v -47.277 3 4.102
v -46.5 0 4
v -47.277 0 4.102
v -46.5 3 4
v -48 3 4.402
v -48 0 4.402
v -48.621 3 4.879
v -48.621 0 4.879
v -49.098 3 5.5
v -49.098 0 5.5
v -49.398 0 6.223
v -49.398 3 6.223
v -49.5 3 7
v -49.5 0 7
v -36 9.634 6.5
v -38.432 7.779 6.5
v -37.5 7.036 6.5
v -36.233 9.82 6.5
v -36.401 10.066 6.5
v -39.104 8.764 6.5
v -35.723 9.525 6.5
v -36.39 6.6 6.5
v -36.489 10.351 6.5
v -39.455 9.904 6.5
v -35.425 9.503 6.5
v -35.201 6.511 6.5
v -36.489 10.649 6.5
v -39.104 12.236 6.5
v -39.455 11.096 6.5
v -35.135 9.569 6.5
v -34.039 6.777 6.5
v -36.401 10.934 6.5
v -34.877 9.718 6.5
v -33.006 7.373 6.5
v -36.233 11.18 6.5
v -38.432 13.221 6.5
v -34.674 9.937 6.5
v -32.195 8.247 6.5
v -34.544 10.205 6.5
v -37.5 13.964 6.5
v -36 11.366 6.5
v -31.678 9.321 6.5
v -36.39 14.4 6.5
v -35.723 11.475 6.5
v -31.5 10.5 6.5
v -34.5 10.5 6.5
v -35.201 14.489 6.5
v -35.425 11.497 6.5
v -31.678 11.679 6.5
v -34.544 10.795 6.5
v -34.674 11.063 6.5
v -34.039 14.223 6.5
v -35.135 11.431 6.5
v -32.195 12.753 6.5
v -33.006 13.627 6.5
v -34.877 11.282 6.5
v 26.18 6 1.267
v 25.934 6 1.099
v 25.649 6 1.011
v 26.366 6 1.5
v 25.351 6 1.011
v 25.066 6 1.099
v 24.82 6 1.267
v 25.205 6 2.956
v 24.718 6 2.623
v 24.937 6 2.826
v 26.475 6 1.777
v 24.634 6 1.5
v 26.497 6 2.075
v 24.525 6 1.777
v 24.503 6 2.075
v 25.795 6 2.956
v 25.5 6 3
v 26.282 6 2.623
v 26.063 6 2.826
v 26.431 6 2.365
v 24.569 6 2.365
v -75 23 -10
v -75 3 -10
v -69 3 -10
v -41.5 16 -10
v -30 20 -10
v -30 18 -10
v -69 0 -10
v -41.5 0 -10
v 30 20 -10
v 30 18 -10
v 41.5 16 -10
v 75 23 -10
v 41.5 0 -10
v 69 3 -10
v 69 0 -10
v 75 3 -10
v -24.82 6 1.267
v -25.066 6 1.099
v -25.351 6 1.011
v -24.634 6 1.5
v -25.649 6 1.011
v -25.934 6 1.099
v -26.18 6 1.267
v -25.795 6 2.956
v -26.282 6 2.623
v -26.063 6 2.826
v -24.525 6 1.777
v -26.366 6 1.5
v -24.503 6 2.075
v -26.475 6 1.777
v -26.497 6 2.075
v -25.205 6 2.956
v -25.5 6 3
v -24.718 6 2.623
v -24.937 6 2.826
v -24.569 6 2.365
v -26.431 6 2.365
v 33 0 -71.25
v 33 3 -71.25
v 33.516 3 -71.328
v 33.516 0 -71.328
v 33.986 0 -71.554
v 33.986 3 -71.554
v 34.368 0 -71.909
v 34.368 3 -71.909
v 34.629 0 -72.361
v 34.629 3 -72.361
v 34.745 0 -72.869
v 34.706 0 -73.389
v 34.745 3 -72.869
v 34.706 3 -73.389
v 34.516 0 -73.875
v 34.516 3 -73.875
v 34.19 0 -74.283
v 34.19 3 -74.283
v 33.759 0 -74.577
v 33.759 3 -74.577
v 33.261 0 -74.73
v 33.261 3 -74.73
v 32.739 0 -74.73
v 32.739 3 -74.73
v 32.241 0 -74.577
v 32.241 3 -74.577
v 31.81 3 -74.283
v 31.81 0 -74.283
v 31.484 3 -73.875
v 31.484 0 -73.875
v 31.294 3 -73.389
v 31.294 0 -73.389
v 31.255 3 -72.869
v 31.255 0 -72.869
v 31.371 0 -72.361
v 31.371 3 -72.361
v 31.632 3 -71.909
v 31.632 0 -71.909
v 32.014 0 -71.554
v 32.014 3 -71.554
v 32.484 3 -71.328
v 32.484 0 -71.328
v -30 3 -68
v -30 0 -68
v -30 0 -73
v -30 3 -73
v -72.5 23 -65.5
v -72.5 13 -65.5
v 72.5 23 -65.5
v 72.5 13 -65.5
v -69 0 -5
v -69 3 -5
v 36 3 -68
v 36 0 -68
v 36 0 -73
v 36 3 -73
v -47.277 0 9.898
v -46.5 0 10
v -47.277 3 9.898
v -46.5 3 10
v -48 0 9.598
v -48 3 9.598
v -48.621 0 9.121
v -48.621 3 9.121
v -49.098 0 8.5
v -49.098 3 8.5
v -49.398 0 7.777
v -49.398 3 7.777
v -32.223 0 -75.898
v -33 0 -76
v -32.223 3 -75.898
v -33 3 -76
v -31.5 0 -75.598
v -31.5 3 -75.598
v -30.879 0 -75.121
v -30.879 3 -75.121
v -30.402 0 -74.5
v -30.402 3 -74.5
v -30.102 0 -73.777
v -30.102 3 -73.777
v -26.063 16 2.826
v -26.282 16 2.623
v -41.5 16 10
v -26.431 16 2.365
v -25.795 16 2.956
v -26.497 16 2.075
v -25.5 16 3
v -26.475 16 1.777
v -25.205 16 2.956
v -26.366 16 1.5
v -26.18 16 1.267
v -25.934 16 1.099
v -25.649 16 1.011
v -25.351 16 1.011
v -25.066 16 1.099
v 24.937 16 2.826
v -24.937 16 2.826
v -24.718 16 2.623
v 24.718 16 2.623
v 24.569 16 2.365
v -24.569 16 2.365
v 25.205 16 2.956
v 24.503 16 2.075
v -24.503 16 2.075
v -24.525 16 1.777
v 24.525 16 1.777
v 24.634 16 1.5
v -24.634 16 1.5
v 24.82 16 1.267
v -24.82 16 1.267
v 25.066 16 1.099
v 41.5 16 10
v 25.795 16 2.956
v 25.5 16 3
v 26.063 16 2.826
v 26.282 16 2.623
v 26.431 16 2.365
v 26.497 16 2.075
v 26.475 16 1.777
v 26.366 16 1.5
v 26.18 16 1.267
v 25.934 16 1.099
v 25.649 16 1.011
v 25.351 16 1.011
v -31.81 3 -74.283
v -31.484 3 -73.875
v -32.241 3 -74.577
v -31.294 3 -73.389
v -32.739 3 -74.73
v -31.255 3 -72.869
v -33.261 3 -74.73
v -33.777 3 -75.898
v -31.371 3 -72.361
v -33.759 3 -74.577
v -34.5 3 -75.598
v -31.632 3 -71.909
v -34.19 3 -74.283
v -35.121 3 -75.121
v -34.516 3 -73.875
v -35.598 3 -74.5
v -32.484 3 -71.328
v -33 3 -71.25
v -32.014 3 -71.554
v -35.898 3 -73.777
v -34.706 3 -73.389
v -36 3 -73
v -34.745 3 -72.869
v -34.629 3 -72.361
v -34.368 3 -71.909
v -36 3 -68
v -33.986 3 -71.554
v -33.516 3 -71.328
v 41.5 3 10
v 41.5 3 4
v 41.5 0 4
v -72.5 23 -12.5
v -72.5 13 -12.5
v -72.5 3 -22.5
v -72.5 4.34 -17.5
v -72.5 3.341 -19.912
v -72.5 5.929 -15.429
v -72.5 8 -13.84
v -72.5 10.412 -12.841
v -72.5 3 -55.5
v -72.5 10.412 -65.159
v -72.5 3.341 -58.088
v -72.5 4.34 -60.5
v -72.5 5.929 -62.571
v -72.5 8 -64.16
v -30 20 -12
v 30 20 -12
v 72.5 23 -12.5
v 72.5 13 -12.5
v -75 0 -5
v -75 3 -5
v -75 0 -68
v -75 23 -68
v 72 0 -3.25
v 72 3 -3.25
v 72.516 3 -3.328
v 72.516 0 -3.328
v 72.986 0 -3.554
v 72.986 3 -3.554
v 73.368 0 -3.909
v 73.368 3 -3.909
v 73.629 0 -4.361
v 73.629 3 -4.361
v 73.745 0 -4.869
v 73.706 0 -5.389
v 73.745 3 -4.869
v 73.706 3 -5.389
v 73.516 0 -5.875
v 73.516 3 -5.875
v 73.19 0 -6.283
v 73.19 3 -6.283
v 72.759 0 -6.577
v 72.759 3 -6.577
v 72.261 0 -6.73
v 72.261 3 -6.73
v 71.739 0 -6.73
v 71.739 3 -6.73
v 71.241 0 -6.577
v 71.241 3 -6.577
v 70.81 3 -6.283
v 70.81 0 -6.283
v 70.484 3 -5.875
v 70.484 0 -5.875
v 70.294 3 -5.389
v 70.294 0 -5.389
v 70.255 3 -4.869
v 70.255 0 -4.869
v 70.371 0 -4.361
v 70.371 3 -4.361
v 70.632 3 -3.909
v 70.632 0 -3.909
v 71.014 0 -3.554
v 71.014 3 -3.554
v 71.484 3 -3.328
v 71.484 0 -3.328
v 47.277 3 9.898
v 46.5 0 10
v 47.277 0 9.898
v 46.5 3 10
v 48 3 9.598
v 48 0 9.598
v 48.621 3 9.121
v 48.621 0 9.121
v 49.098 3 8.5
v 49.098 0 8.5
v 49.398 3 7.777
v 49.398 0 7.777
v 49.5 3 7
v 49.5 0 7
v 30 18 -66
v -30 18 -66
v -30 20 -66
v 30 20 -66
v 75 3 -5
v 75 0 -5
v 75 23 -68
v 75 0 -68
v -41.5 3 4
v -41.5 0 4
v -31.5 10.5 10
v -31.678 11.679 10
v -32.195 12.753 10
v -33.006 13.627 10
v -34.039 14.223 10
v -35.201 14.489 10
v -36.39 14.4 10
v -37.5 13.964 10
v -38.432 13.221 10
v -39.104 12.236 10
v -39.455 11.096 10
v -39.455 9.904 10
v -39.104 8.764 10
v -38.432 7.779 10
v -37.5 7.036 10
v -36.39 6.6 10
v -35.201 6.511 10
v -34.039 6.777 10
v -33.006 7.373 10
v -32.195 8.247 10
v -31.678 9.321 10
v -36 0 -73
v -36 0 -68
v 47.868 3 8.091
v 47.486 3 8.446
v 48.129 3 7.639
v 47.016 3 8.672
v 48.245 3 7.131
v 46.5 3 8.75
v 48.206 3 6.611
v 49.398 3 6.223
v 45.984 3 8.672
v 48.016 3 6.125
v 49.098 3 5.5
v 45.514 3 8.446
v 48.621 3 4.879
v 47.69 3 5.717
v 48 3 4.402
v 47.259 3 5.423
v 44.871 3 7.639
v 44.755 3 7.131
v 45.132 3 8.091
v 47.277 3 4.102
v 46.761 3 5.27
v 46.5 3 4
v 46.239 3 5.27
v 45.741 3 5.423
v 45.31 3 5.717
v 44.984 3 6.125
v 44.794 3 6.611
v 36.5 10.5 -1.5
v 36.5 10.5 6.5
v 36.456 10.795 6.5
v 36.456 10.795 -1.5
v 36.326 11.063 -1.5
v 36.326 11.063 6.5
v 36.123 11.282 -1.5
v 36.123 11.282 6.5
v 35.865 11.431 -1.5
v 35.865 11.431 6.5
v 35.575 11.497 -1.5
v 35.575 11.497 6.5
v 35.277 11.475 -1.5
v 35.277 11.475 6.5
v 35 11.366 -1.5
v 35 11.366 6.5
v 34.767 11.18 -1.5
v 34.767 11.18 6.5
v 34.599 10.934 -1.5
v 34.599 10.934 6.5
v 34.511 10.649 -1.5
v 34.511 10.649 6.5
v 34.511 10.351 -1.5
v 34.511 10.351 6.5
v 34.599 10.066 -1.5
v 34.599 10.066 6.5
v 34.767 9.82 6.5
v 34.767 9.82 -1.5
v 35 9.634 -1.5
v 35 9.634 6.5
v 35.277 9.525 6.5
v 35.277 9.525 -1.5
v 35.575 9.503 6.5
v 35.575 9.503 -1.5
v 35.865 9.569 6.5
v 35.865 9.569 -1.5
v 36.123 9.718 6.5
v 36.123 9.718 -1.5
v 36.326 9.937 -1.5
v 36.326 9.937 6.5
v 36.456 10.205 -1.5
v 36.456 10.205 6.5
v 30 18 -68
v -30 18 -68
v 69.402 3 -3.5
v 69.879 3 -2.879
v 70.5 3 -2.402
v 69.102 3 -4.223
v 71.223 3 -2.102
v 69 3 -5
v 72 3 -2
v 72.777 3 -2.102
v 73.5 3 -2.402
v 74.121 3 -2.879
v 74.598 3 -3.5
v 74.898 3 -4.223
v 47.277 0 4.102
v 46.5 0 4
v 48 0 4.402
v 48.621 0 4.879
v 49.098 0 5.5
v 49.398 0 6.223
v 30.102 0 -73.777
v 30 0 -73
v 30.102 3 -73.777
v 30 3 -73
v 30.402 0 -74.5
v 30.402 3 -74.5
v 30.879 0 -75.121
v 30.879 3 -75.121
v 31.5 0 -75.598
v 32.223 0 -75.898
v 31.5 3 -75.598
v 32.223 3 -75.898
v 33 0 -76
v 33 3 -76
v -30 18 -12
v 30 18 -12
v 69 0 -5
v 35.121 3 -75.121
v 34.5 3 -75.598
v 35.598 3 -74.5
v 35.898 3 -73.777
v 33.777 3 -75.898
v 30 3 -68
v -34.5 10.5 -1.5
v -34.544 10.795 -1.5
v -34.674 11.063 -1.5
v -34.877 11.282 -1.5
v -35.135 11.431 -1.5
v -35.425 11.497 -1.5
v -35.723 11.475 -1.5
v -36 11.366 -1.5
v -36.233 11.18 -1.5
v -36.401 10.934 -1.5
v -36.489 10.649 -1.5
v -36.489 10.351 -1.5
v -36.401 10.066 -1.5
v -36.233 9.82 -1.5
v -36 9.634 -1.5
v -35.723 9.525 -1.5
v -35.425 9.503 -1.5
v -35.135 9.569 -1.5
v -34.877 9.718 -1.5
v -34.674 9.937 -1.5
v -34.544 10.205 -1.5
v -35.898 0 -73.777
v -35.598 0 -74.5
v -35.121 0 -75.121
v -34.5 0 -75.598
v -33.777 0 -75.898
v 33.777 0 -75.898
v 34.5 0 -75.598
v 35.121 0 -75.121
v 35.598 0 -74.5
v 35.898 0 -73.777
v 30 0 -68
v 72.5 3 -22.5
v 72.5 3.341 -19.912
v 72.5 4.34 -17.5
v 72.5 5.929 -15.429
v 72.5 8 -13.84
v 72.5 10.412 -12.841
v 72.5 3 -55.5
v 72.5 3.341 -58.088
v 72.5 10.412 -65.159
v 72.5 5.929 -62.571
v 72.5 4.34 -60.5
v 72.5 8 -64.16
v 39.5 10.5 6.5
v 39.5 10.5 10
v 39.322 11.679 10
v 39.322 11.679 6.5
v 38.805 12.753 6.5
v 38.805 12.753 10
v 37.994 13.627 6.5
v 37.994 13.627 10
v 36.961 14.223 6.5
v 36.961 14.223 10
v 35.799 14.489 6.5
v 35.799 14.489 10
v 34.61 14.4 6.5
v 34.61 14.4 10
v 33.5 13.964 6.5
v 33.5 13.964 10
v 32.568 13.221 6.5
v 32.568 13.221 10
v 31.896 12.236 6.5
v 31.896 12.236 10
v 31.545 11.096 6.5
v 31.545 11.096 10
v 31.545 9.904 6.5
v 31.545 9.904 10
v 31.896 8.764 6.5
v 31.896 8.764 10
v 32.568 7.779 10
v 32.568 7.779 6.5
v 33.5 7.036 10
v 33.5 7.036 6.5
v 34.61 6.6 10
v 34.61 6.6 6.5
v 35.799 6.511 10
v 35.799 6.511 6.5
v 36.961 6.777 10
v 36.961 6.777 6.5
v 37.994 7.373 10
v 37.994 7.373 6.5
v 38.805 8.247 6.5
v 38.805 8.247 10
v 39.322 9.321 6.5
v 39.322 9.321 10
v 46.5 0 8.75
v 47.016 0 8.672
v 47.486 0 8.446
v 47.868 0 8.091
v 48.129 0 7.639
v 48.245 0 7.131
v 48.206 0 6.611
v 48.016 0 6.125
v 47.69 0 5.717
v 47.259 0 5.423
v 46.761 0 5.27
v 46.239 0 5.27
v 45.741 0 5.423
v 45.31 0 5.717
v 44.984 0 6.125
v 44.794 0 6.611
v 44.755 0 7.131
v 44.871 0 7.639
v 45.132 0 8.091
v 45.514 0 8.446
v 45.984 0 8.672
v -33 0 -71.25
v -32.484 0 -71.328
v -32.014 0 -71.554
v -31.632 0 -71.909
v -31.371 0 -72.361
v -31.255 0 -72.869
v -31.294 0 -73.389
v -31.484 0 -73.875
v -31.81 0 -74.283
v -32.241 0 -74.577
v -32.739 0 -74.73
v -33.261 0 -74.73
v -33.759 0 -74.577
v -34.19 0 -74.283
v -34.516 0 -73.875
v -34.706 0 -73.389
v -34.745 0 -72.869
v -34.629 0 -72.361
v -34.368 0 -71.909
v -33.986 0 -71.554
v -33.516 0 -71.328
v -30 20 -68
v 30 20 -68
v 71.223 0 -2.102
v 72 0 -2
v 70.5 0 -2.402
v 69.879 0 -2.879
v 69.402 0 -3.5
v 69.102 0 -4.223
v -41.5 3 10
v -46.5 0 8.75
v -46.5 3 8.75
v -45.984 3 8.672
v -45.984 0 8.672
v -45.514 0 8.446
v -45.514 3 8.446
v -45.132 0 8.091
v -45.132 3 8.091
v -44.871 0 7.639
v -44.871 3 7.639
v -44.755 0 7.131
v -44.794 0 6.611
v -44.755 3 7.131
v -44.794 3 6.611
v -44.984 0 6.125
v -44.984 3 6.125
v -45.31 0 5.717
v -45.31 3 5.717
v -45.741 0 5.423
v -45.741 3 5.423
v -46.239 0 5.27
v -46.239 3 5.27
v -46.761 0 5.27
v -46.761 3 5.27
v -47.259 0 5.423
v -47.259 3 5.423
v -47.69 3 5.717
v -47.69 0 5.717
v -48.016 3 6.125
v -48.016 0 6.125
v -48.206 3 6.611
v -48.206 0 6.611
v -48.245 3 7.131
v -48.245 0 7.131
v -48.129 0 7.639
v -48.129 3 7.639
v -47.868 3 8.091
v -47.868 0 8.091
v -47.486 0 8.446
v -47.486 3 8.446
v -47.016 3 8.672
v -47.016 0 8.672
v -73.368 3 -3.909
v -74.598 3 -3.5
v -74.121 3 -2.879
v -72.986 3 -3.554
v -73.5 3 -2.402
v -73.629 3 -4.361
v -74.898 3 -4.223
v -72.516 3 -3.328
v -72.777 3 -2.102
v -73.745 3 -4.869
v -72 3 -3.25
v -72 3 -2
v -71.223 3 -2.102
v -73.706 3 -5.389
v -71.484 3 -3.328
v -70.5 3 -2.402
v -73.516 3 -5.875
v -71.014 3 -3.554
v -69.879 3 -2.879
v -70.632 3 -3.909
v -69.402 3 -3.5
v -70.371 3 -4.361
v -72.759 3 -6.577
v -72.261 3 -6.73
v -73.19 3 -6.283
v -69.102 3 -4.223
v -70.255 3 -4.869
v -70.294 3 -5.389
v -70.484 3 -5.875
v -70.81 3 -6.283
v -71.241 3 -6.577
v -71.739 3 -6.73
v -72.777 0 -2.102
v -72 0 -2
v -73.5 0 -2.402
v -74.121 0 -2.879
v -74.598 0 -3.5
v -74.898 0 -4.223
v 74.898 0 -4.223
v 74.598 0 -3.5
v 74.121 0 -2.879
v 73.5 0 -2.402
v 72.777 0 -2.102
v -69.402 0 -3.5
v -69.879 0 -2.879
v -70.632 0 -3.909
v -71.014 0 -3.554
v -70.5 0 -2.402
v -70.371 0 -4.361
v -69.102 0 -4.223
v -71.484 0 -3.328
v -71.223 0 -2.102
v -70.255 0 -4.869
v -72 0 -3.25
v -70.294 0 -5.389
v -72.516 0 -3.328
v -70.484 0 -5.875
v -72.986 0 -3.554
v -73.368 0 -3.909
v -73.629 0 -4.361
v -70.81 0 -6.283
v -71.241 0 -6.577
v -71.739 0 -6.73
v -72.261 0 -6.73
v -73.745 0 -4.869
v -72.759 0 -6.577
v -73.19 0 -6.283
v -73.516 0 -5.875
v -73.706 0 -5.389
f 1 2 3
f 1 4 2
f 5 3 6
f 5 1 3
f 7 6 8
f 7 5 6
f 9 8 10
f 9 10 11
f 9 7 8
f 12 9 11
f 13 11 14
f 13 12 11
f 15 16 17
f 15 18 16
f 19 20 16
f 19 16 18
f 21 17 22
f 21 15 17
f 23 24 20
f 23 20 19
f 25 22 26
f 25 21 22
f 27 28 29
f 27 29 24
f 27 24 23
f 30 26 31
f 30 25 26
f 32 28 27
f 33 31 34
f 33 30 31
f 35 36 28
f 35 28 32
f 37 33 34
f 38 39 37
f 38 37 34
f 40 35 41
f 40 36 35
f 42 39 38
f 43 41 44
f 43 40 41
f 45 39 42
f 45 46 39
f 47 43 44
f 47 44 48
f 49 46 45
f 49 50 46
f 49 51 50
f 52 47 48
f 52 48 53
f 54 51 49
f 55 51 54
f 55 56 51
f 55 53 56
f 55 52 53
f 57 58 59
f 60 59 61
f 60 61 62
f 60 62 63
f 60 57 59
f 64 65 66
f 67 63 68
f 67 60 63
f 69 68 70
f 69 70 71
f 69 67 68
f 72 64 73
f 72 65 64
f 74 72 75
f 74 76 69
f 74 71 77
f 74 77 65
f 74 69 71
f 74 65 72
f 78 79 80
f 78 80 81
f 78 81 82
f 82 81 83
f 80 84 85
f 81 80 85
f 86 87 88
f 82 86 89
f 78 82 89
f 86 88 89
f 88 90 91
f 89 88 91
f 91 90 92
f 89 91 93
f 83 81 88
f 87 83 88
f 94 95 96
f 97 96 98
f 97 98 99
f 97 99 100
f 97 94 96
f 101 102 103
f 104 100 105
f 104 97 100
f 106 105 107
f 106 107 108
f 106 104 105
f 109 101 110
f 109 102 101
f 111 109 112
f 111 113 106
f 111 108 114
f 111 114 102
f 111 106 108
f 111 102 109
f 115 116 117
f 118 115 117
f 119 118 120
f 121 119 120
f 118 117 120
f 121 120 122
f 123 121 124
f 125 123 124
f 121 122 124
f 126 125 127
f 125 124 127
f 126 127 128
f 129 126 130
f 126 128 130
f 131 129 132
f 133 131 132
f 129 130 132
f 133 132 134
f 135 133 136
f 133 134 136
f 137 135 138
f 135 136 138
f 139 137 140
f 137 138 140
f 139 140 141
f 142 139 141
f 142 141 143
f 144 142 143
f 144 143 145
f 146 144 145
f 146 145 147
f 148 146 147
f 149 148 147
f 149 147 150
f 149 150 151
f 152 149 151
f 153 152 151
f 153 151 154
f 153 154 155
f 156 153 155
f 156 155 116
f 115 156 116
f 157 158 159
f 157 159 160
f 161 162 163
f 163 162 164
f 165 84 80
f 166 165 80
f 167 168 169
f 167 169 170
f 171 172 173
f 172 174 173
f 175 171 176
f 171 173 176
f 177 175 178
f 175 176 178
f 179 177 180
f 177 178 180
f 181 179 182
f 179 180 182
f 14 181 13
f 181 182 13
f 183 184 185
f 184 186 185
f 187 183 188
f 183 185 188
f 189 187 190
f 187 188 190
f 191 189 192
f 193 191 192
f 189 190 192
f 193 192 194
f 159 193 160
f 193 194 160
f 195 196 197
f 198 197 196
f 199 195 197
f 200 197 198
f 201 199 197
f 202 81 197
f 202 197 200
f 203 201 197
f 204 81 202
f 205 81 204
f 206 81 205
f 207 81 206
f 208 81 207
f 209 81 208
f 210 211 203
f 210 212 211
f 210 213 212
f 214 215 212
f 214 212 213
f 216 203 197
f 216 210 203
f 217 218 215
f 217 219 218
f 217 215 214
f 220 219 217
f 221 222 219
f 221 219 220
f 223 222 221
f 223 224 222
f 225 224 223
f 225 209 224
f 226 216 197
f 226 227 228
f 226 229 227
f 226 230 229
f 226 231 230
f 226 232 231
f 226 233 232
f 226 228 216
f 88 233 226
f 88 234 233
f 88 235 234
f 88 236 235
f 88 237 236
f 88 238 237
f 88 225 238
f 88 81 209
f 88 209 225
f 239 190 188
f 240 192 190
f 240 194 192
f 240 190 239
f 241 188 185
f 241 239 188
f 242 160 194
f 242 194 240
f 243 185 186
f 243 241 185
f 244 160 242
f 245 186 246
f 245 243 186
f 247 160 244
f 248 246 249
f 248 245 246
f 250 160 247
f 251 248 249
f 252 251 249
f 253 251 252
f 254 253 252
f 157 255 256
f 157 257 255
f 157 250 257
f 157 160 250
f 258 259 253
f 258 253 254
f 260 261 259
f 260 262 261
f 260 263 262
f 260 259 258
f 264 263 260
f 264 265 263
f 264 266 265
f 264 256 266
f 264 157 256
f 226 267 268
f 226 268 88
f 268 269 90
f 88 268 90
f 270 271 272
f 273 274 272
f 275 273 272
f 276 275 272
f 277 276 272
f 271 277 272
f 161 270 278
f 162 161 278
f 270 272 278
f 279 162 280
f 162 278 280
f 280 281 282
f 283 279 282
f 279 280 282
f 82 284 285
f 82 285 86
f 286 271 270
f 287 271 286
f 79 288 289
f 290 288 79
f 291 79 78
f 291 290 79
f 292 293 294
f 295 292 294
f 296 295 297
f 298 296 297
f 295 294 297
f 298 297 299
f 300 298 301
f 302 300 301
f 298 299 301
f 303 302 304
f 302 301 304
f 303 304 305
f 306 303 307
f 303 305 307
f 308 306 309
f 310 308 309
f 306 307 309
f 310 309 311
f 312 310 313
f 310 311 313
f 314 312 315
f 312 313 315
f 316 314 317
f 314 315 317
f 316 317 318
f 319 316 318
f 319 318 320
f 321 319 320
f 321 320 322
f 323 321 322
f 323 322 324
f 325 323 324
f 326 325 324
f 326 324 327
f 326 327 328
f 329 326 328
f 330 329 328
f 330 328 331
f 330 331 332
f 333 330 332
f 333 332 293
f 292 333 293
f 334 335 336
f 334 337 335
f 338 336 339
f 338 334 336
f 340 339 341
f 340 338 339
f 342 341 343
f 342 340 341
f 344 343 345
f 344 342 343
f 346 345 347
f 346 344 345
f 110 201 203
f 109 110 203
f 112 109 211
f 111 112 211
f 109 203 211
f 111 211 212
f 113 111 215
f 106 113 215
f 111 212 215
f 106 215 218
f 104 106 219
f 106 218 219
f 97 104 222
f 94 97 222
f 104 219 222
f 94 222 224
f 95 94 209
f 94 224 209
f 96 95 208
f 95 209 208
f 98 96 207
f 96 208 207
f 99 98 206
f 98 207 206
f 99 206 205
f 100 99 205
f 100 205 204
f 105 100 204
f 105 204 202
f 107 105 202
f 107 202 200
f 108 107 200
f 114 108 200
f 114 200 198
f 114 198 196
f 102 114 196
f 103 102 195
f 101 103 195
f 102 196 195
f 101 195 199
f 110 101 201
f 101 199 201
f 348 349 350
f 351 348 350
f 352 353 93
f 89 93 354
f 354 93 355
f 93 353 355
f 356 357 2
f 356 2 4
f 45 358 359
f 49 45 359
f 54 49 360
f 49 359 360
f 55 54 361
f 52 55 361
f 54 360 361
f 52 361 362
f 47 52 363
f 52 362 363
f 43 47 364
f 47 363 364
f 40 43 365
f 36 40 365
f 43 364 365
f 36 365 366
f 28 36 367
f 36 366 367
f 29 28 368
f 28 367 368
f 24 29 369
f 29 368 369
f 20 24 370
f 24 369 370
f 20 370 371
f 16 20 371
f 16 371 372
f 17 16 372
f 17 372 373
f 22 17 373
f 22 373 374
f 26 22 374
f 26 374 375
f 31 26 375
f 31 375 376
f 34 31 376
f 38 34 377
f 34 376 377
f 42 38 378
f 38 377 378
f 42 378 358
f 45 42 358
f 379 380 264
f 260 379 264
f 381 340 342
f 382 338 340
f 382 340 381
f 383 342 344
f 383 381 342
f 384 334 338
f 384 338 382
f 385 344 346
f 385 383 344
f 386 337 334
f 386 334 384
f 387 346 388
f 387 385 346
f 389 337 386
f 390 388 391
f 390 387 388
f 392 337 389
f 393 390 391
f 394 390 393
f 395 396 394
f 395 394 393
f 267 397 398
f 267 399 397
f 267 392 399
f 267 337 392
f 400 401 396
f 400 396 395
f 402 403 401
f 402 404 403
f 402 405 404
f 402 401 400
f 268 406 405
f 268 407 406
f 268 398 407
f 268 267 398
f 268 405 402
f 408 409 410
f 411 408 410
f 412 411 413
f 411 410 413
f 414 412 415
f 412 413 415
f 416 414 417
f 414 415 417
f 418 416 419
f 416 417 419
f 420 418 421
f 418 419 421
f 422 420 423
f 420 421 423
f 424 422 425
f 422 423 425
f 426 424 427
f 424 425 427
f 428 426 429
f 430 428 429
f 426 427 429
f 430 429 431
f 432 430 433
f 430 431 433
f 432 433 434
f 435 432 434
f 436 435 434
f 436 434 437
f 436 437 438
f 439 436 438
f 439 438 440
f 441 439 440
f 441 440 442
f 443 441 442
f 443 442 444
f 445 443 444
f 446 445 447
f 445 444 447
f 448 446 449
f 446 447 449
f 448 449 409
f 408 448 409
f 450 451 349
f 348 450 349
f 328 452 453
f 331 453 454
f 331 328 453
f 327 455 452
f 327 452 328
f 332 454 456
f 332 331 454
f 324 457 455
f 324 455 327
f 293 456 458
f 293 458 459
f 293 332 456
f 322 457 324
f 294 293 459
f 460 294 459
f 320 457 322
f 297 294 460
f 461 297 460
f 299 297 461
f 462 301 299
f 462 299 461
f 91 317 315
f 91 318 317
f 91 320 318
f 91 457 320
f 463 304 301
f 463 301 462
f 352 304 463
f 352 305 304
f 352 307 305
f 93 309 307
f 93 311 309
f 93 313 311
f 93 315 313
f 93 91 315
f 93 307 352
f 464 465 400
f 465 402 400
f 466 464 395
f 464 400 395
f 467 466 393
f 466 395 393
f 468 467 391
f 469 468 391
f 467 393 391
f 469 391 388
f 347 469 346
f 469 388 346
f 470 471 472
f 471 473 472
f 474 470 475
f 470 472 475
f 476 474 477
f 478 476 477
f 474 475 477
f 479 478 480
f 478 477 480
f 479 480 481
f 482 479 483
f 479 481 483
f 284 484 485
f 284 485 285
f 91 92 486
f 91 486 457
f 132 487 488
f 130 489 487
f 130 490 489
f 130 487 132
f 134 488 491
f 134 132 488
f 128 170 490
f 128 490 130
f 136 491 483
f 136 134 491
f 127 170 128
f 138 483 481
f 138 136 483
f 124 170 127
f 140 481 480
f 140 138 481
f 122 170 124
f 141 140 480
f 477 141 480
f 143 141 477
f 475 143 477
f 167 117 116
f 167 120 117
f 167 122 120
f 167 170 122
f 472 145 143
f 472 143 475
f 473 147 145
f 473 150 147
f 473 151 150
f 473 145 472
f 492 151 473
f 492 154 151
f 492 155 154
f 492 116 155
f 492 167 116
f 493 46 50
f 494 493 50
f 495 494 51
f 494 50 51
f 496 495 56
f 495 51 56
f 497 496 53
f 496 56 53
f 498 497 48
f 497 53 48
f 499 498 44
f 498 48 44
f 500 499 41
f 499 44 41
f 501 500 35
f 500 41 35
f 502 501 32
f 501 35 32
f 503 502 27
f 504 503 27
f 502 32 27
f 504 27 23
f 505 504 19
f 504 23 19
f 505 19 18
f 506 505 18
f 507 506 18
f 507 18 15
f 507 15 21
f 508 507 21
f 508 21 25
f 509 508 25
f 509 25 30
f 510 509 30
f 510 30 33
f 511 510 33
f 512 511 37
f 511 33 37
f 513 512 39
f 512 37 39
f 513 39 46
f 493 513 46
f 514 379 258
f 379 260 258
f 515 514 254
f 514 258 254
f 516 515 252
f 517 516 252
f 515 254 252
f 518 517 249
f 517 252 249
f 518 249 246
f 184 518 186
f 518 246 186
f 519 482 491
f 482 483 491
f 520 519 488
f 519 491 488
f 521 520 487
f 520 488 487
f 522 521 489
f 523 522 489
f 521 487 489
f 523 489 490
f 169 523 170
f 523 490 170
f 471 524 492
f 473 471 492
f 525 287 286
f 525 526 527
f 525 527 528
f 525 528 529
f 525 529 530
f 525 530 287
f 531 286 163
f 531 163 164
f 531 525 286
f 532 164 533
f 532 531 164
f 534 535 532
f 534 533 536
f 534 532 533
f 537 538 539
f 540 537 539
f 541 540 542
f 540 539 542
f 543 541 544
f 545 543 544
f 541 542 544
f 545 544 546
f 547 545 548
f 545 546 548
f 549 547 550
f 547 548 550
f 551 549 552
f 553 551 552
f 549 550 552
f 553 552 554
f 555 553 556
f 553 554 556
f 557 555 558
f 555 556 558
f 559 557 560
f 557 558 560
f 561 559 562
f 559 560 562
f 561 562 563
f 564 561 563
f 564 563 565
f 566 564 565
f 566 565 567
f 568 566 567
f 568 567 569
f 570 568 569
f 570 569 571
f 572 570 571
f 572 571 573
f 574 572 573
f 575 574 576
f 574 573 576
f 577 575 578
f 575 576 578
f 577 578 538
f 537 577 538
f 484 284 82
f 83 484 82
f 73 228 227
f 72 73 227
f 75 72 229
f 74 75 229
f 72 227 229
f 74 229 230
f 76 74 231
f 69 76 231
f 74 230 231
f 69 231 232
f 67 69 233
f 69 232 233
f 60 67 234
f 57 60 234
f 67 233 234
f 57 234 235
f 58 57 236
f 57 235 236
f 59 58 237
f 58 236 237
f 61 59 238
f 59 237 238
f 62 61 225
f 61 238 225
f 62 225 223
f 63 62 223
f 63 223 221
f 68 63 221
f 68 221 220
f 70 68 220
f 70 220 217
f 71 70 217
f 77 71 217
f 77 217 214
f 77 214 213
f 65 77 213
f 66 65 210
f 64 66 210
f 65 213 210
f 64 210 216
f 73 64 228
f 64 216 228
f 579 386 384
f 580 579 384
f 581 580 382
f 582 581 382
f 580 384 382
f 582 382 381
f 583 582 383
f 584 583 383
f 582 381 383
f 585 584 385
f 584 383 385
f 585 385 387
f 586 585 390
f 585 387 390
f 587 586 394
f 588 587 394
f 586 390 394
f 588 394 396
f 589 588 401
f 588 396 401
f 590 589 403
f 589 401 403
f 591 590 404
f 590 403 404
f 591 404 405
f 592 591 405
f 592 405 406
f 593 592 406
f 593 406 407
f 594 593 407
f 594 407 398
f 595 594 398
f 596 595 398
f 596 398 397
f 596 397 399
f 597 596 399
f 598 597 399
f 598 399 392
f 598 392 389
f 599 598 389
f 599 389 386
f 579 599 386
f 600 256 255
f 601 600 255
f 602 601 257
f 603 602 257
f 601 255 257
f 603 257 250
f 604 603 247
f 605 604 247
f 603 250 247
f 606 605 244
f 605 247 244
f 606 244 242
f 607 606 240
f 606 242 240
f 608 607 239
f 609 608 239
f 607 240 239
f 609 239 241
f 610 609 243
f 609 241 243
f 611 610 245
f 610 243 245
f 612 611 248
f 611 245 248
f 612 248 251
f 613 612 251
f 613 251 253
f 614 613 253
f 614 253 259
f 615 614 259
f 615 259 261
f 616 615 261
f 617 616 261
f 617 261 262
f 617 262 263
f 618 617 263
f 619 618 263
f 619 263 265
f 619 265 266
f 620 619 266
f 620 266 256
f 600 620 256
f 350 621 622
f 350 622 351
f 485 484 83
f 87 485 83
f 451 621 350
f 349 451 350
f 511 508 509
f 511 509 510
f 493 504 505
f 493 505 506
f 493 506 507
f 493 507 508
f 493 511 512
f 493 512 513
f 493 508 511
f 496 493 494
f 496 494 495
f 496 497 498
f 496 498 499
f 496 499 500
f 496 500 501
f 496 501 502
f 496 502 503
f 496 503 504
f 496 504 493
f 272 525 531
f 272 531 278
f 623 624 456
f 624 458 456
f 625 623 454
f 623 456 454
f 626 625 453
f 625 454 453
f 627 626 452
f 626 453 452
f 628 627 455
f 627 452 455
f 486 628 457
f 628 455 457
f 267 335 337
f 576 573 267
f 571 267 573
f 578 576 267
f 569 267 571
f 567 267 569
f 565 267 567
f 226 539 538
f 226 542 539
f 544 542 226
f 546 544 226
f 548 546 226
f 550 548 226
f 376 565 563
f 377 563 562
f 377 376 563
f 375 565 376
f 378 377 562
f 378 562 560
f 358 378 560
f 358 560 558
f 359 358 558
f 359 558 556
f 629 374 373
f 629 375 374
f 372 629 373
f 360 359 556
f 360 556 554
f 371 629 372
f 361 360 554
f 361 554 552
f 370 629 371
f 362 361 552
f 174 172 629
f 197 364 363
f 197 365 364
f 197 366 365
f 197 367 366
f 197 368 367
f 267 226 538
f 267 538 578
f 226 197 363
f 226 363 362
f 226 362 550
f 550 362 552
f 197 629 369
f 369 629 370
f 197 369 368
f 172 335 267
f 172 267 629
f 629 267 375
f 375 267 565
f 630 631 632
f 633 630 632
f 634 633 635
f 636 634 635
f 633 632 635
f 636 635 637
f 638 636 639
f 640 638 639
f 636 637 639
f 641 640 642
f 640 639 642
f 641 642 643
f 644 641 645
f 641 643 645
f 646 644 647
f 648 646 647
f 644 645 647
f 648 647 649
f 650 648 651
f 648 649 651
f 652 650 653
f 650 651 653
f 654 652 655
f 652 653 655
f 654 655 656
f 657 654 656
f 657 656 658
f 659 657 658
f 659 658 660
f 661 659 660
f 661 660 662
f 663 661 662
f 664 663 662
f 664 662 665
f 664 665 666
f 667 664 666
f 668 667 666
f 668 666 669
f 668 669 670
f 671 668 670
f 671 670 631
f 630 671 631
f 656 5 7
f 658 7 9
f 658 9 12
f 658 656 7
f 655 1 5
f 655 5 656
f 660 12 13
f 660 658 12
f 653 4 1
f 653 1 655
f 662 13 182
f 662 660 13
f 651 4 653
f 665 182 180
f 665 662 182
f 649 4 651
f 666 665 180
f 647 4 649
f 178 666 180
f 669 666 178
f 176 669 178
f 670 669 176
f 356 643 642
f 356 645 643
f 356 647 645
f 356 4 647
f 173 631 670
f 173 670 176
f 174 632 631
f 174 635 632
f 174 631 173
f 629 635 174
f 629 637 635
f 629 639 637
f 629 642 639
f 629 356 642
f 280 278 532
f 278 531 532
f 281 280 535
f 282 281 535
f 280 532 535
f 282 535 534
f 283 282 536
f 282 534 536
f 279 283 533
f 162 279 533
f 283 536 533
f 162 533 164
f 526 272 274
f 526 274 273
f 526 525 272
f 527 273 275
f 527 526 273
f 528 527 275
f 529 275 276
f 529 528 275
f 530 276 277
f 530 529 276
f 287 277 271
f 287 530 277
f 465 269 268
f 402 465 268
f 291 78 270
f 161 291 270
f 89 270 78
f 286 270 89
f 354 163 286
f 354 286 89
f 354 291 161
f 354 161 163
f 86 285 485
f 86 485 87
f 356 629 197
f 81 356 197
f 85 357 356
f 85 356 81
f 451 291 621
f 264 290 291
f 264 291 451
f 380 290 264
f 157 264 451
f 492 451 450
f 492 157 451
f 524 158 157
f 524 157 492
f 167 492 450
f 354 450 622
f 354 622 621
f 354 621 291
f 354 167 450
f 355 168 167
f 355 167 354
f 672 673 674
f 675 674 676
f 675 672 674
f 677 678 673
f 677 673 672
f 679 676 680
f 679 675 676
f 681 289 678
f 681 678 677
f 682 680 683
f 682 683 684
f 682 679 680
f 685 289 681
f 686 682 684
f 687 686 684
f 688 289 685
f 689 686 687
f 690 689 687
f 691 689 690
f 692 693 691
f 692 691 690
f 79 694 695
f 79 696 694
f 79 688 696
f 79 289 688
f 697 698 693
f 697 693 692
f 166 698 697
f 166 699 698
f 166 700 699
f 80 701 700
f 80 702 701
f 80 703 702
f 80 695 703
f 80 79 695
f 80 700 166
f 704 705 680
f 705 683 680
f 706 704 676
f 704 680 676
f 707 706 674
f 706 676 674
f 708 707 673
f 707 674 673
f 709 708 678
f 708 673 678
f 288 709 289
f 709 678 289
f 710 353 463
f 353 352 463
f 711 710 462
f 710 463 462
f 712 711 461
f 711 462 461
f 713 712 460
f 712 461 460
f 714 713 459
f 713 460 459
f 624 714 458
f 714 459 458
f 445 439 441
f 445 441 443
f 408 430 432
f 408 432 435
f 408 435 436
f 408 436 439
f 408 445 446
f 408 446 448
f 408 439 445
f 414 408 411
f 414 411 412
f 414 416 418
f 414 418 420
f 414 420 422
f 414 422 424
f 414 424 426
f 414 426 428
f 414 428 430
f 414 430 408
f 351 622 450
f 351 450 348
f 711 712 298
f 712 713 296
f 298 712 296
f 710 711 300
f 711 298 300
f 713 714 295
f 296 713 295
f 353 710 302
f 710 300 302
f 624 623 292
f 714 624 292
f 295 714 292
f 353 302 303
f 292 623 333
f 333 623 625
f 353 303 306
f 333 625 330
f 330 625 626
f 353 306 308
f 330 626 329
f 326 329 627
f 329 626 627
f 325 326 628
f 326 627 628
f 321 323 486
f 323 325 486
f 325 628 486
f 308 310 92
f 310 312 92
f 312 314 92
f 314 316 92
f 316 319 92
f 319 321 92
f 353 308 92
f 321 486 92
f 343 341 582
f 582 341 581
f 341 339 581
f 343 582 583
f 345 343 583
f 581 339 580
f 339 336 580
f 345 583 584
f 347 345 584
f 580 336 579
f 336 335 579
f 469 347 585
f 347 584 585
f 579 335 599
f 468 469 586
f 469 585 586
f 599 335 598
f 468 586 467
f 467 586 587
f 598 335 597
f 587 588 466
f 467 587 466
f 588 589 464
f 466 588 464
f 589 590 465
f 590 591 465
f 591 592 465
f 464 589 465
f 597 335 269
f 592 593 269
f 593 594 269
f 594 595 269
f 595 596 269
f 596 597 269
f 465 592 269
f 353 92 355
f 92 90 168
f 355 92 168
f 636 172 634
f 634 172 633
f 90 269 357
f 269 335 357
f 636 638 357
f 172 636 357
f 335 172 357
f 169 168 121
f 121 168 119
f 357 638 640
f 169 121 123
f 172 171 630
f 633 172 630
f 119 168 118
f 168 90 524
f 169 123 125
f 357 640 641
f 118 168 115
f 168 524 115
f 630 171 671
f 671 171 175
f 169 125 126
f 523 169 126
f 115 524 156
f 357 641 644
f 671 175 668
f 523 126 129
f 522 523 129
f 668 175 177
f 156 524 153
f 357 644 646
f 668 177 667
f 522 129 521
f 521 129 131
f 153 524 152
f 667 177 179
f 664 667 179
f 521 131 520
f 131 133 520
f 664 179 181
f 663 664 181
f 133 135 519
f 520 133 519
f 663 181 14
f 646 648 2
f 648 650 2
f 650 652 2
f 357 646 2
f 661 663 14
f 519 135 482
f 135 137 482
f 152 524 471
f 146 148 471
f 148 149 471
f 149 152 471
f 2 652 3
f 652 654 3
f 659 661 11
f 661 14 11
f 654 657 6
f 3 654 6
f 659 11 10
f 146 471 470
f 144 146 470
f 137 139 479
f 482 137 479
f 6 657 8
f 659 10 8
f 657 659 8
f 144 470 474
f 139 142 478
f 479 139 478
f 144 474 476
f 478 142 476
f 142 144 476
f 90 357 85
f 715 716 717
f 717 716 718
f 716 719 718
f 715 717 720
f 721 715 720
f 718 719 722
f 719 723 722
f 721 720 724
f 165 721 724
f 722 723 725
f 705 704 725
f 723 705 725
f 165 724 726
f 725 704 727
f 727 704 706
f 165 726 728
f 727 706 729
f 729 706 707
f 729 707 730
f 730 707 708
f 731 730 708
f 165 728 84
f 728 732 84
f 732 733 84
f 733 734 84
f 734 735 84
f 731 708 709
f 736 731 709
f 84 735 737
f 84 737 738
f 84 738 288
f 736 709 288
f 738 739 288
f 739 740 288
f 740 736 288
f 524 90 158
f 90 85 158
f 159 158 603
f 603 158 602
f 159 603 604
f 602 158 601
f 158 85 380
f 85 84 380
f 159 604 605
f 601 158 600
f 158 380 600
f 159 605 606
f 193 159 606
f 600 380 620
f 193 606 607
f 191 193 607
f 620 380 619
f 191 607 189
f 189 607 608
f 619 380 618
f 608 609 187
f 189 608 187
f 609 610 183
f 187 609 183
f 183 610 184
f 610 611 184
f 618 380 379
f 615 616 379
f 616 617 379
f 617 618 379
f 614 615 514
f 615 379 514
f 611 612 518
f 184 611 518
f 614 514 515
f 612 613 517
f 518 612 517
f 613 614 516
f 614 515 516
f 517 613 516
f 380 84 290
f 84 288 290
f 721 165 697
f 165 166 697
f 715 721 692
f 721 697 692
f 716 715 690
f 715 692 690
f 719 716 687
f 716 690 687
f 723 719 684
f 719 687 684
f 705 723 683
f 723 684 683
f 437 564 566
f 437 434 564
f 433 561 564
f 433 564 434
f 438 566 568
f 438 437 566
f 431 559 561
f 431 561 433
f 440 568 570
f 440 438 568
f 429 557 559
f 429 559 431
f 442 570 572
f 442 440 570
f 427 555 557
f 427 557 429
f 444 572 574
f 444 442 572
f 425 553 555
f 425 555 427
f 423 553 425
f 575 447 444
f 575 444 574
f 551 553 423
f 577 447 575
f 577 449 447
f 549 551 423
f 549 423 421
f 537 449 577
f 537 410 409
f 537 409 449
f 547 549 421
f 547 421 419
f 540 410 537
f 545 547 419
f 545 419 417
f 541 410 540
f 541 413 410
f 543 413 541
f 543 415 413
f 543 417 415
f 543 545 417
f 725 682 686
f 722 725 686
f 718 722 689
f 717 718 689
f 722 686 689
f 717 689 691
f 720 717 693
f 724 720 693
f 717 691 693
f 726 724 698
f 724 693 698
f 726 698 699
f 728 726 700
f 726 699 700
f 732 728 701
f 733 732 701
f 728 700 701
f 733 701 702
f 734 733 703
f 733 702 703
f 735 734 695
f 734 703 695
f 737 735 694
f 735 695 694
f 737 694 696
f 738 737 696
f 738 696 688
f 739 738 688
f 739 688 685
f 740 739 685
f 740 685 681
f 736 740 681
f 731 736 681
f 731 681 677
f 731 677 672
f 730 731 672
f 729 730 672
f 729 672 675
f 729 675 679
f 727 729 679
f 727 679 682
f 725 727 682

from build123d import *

# Parameters (mm, degrees)
SKETCH_1_W          = 83
SKETCH_1_H          = 20
EXTRUDE_1_DEPTH     = 16
SKETCH_2_R          = 4
CUT_EXTRUDE_1_DEPTH = 3.5
SKETCH_3_R          = 1
CUT_EXTRUDE_2_DEPTH = 10
SKETCH_6_R          = 1
CUT_EXTRUDE_5_DEPTH = 8
SKETCH_7_W          = 150
SKETCH_7_H          = 3
EXTRUDE_2_DEPTH     = 58
SKETCH_8_W          = 150
SKETCH_8_H          = 58
SKETCH_8_W_2        = 145
SKETCH_8_H_2        = 53
EXTRUDE_3_DEPTH     = 20
FILLET_1_R          = 10
CUT_EXTRUDE_START   = -45
SKETCH_9_W          = 2
SKETCH_9_H          = 2
CUT_EXTRUDE_6_DEPTH = 60
SKETCH_10_W         = 6
SKETCH_10_H         = 3
EXTRUDE_4_DEPTH     = 8
SKETCH_11_W         = 6
SKETCH_11_H         = 3
EXTRUDE_5_DEPTH     = 8
SKETCH_12_W         = 6
SKETCH_12_H         = 3
EXTRUDE_6_DEPTH     = 8
SKETCH_13_W         = 6
SKETCH_13_H         = 3
EXTRUDE_7_DEPTH     = 8
FILLET_2_R          = 3
SKETCH_14_R         = 1.75
CUT_EXTRUDE_7_DEPTH = 109.632407688


with BuildPart() as part:
    # 스케치1 → 보스-돌출1 (new body)
    with BuildSketch(Plane(origin=(0, 0, 0), x_dir=(1, 0, 0), z_dir=(0, 1, 0))):
        Rectangle(SKETCH_1_W, SKETCH_1_H)
    extrude(amount=EXTRUDE_1_DEPTH)

    # 스케치2 → 컷-돌출1 (cut)
    with BuildSketch(Plane.XY.offset(10)):
        with Locations((-35.5, 10.5)):
            Circle(SKETCH_2_R)
        with Locations((35.5, 10.5)):
            Circle(SKETCH_2_R)
    extrude(amount=-CUT_EXTRUDE_1_DEPTH, mode=Mode.SUBTRACT)

    # 스케치3 → 컷-돌출2 (cut)
    with BuildSketch(Plane(origin=(0, 16, 0), x_dir=(1, 0, 0), z_dir=(0, 1, 0))):
        with Locations(Location((-25.5, -2, 0), (0, 0, 270))):
            Circle(SKETCH_3_R)
        with Locations(Location((25.5, -2, 0), (0, 0, 270))):
            Circle(SKETCH_3_R)
    extrude(amount=-CUT_EXTRUDE_2_DEPTH, mode=Mode.SUBTRACT)

    # 스케치6 → 컷-돌출5 (cut)
    with BuildSketch(Plane.XY.offset(6.5)):
        with Locations((-35.5, 10.5)):
            Circle(SKETCH_6_R)
        with Locations((35.5, 10.5)):
            Circle(SKETCH_6_R)
    extrude(amount=-CUT_EXTRUDE_5_DEPTH, mode=Mode.SUBTRACT)

    # 스케치7 → 보스-돌출2 (add)
    with BuildSketch(Plane(origin=(0, 0, -10), x_dir=(-1, 0, 0), z_dir=(0, 0, -1))):
        with Locations((0, 1.5)):
            Rectangle(SKETCH_7_W, SKETCH_7_H)
    extrude(amount=EXTRUDE_2_DEPTH)

    # 스케치8 → 보스-돌출3 (add)
    with BuildSketch(Plane(origin=(0, 3, 0), x_dir=(1, 0, 0), z_dir=(0, 1, 0))):
        with Locations((0, 39)):
            Rectangle(SKETCH_8_W, SKETCH_8_H)
        with Locations((0, 39)):
            Rectangle(SKETCH_8_W_2, SKETCH_8_H_2, mode=Mode.SUBTRACT)
    extrude(amount=EXTRUDE_3_DEPTH)

    # 필렛1
    fillet_1_edges = [part.edges().sort_by_distance(p)[0] for p in [
        (0, 3, -65.5),
        (0, 3, -12.5),
    ]]
    fillet(fillet_1_edges, radius=FILLET_1_R)

    # 스케치9 → 컷-돌출6 (cut)
    with BuildSketch(Plane.ZY.offset(75).offset(CUT_EXTRUDE_START)):
        with Locations((-67, 19)):
            Rectangle(SKETCH_9_W, SKETCH_9_H)
        with Locations((-11, 19)):
            Rectangle(SKETCH_9_W, SKETCH_9_H)
    extrude(amount=-CUT_EXTRUDE_6_DEPTH, mode=Mode.SUBTRACT)

    # 스케치10 → 보스-돌출4 (add)
    with BuildSketch(Plane.XY.offset(-10)):
        with Locations((-72, 1.5)):
            Rectangle(SKETCH_10_W, SKETCH_10_H)
        with Locations((72, 1.5)):
            Rectangle(SKETCH_10_W, SKETCH_10_H)
    extrude(amount=EXTRUDE_4_DEPTH)

    # 스케치11 → 보스-돌출5 (add)
    with BuildSketch(Plane(origin=(0, 0, -68), x_dir=(-1, 0, 0), z_dir=(0, 0, -1))):
        with Locations((-33, 1.5)):
            Rectangle(SKETCH_11_W, SKETCH_11_H)
        with Locations((33, 1.5)):
            Rectangle(SKETCH_11_W, SKETCH_11_H)
    extrude(amount=EXTRUDE_5_DEPTH)

    # 스케치12 → 보스-돌출6 (add)
    with BuildSketch(Plane.ZY.offset(41.5)):
        with Locations((7, 1.5)):
            Rectangle(SKETCH_12_W, SKETCH_12_H)
    extrude(amount=EXTRUDE_6_DEPTH)

    # 스케치13 → 보스-돌출7 (add)
    with BuildSketch(Plane(origin=(41.5, 0, 0), x_dir=(0, 0, -1), z_dir=(1, 0, 0))):
        with Locations((-7, 1.5)):
            Rectangle(SKETCH_13_W, SKETCH_13_H)
    extrude(amount=EXTRUDE_7_DEPTH)

    # 필렛2
    fillet_2_edges = [part.edges().sort_by_distance(p)[0] for p in [
        (69, 1.5, -2),
        (75, 1.5, -2),
        (-75, 1.5, -2),
        (-69, 1.5, -2),
        (-36, 1.5, -76),
        (-30, 1.5, -76),
        (30, 1.5, -76),
        (36, 1.5, -76),
        (-49.5, 1.5, 4),
        (-49.5, 1.5, 10),
        (49.5, 1.5, 10),
        (49.5, 1.5, 4),
    ]]
    fillet(fillet_2_edges, radius=FILLET_2_R - 0.0001)  # a hair under: the kernel refuses the full size

    # 스케치14 → 컷-돌출7 (cut, through all)
    with BuildSketch(Plane(origin=(0, 3, 0), x_dir=(1, 0, 0), z_dir=(0, 1, 0))):
        with Locations(Location((-33, 73, 0), (0, 0, 270))):
            Circle(SKETCH_14_R)
        with Locations(Location((33, 73, 0), (0, 0, 270))):
            Circle(SKETCH_14_R)
        with Locations(Location((-46.5, -7, 0), (0, 0, 270))):
            Circle(SKETCH_14_R)
        with Locations(Location((46.5, -7, 0), (0, 0, 270))):
            Circle(SKETCH_14_R)
        with Locations(Location((72, 5, 0), (0, 0, 270))):
            Circle(SKETCH_14_R)
        with Locations(Location((-72, 5, 0), (0, 0, 270))):
            Circle(SKETCH_14_R)
    extrude(amount=-CUT_EXTRUDE_7_DEPTH, mode=Mode.SUBTRACT)


solid = part.part
